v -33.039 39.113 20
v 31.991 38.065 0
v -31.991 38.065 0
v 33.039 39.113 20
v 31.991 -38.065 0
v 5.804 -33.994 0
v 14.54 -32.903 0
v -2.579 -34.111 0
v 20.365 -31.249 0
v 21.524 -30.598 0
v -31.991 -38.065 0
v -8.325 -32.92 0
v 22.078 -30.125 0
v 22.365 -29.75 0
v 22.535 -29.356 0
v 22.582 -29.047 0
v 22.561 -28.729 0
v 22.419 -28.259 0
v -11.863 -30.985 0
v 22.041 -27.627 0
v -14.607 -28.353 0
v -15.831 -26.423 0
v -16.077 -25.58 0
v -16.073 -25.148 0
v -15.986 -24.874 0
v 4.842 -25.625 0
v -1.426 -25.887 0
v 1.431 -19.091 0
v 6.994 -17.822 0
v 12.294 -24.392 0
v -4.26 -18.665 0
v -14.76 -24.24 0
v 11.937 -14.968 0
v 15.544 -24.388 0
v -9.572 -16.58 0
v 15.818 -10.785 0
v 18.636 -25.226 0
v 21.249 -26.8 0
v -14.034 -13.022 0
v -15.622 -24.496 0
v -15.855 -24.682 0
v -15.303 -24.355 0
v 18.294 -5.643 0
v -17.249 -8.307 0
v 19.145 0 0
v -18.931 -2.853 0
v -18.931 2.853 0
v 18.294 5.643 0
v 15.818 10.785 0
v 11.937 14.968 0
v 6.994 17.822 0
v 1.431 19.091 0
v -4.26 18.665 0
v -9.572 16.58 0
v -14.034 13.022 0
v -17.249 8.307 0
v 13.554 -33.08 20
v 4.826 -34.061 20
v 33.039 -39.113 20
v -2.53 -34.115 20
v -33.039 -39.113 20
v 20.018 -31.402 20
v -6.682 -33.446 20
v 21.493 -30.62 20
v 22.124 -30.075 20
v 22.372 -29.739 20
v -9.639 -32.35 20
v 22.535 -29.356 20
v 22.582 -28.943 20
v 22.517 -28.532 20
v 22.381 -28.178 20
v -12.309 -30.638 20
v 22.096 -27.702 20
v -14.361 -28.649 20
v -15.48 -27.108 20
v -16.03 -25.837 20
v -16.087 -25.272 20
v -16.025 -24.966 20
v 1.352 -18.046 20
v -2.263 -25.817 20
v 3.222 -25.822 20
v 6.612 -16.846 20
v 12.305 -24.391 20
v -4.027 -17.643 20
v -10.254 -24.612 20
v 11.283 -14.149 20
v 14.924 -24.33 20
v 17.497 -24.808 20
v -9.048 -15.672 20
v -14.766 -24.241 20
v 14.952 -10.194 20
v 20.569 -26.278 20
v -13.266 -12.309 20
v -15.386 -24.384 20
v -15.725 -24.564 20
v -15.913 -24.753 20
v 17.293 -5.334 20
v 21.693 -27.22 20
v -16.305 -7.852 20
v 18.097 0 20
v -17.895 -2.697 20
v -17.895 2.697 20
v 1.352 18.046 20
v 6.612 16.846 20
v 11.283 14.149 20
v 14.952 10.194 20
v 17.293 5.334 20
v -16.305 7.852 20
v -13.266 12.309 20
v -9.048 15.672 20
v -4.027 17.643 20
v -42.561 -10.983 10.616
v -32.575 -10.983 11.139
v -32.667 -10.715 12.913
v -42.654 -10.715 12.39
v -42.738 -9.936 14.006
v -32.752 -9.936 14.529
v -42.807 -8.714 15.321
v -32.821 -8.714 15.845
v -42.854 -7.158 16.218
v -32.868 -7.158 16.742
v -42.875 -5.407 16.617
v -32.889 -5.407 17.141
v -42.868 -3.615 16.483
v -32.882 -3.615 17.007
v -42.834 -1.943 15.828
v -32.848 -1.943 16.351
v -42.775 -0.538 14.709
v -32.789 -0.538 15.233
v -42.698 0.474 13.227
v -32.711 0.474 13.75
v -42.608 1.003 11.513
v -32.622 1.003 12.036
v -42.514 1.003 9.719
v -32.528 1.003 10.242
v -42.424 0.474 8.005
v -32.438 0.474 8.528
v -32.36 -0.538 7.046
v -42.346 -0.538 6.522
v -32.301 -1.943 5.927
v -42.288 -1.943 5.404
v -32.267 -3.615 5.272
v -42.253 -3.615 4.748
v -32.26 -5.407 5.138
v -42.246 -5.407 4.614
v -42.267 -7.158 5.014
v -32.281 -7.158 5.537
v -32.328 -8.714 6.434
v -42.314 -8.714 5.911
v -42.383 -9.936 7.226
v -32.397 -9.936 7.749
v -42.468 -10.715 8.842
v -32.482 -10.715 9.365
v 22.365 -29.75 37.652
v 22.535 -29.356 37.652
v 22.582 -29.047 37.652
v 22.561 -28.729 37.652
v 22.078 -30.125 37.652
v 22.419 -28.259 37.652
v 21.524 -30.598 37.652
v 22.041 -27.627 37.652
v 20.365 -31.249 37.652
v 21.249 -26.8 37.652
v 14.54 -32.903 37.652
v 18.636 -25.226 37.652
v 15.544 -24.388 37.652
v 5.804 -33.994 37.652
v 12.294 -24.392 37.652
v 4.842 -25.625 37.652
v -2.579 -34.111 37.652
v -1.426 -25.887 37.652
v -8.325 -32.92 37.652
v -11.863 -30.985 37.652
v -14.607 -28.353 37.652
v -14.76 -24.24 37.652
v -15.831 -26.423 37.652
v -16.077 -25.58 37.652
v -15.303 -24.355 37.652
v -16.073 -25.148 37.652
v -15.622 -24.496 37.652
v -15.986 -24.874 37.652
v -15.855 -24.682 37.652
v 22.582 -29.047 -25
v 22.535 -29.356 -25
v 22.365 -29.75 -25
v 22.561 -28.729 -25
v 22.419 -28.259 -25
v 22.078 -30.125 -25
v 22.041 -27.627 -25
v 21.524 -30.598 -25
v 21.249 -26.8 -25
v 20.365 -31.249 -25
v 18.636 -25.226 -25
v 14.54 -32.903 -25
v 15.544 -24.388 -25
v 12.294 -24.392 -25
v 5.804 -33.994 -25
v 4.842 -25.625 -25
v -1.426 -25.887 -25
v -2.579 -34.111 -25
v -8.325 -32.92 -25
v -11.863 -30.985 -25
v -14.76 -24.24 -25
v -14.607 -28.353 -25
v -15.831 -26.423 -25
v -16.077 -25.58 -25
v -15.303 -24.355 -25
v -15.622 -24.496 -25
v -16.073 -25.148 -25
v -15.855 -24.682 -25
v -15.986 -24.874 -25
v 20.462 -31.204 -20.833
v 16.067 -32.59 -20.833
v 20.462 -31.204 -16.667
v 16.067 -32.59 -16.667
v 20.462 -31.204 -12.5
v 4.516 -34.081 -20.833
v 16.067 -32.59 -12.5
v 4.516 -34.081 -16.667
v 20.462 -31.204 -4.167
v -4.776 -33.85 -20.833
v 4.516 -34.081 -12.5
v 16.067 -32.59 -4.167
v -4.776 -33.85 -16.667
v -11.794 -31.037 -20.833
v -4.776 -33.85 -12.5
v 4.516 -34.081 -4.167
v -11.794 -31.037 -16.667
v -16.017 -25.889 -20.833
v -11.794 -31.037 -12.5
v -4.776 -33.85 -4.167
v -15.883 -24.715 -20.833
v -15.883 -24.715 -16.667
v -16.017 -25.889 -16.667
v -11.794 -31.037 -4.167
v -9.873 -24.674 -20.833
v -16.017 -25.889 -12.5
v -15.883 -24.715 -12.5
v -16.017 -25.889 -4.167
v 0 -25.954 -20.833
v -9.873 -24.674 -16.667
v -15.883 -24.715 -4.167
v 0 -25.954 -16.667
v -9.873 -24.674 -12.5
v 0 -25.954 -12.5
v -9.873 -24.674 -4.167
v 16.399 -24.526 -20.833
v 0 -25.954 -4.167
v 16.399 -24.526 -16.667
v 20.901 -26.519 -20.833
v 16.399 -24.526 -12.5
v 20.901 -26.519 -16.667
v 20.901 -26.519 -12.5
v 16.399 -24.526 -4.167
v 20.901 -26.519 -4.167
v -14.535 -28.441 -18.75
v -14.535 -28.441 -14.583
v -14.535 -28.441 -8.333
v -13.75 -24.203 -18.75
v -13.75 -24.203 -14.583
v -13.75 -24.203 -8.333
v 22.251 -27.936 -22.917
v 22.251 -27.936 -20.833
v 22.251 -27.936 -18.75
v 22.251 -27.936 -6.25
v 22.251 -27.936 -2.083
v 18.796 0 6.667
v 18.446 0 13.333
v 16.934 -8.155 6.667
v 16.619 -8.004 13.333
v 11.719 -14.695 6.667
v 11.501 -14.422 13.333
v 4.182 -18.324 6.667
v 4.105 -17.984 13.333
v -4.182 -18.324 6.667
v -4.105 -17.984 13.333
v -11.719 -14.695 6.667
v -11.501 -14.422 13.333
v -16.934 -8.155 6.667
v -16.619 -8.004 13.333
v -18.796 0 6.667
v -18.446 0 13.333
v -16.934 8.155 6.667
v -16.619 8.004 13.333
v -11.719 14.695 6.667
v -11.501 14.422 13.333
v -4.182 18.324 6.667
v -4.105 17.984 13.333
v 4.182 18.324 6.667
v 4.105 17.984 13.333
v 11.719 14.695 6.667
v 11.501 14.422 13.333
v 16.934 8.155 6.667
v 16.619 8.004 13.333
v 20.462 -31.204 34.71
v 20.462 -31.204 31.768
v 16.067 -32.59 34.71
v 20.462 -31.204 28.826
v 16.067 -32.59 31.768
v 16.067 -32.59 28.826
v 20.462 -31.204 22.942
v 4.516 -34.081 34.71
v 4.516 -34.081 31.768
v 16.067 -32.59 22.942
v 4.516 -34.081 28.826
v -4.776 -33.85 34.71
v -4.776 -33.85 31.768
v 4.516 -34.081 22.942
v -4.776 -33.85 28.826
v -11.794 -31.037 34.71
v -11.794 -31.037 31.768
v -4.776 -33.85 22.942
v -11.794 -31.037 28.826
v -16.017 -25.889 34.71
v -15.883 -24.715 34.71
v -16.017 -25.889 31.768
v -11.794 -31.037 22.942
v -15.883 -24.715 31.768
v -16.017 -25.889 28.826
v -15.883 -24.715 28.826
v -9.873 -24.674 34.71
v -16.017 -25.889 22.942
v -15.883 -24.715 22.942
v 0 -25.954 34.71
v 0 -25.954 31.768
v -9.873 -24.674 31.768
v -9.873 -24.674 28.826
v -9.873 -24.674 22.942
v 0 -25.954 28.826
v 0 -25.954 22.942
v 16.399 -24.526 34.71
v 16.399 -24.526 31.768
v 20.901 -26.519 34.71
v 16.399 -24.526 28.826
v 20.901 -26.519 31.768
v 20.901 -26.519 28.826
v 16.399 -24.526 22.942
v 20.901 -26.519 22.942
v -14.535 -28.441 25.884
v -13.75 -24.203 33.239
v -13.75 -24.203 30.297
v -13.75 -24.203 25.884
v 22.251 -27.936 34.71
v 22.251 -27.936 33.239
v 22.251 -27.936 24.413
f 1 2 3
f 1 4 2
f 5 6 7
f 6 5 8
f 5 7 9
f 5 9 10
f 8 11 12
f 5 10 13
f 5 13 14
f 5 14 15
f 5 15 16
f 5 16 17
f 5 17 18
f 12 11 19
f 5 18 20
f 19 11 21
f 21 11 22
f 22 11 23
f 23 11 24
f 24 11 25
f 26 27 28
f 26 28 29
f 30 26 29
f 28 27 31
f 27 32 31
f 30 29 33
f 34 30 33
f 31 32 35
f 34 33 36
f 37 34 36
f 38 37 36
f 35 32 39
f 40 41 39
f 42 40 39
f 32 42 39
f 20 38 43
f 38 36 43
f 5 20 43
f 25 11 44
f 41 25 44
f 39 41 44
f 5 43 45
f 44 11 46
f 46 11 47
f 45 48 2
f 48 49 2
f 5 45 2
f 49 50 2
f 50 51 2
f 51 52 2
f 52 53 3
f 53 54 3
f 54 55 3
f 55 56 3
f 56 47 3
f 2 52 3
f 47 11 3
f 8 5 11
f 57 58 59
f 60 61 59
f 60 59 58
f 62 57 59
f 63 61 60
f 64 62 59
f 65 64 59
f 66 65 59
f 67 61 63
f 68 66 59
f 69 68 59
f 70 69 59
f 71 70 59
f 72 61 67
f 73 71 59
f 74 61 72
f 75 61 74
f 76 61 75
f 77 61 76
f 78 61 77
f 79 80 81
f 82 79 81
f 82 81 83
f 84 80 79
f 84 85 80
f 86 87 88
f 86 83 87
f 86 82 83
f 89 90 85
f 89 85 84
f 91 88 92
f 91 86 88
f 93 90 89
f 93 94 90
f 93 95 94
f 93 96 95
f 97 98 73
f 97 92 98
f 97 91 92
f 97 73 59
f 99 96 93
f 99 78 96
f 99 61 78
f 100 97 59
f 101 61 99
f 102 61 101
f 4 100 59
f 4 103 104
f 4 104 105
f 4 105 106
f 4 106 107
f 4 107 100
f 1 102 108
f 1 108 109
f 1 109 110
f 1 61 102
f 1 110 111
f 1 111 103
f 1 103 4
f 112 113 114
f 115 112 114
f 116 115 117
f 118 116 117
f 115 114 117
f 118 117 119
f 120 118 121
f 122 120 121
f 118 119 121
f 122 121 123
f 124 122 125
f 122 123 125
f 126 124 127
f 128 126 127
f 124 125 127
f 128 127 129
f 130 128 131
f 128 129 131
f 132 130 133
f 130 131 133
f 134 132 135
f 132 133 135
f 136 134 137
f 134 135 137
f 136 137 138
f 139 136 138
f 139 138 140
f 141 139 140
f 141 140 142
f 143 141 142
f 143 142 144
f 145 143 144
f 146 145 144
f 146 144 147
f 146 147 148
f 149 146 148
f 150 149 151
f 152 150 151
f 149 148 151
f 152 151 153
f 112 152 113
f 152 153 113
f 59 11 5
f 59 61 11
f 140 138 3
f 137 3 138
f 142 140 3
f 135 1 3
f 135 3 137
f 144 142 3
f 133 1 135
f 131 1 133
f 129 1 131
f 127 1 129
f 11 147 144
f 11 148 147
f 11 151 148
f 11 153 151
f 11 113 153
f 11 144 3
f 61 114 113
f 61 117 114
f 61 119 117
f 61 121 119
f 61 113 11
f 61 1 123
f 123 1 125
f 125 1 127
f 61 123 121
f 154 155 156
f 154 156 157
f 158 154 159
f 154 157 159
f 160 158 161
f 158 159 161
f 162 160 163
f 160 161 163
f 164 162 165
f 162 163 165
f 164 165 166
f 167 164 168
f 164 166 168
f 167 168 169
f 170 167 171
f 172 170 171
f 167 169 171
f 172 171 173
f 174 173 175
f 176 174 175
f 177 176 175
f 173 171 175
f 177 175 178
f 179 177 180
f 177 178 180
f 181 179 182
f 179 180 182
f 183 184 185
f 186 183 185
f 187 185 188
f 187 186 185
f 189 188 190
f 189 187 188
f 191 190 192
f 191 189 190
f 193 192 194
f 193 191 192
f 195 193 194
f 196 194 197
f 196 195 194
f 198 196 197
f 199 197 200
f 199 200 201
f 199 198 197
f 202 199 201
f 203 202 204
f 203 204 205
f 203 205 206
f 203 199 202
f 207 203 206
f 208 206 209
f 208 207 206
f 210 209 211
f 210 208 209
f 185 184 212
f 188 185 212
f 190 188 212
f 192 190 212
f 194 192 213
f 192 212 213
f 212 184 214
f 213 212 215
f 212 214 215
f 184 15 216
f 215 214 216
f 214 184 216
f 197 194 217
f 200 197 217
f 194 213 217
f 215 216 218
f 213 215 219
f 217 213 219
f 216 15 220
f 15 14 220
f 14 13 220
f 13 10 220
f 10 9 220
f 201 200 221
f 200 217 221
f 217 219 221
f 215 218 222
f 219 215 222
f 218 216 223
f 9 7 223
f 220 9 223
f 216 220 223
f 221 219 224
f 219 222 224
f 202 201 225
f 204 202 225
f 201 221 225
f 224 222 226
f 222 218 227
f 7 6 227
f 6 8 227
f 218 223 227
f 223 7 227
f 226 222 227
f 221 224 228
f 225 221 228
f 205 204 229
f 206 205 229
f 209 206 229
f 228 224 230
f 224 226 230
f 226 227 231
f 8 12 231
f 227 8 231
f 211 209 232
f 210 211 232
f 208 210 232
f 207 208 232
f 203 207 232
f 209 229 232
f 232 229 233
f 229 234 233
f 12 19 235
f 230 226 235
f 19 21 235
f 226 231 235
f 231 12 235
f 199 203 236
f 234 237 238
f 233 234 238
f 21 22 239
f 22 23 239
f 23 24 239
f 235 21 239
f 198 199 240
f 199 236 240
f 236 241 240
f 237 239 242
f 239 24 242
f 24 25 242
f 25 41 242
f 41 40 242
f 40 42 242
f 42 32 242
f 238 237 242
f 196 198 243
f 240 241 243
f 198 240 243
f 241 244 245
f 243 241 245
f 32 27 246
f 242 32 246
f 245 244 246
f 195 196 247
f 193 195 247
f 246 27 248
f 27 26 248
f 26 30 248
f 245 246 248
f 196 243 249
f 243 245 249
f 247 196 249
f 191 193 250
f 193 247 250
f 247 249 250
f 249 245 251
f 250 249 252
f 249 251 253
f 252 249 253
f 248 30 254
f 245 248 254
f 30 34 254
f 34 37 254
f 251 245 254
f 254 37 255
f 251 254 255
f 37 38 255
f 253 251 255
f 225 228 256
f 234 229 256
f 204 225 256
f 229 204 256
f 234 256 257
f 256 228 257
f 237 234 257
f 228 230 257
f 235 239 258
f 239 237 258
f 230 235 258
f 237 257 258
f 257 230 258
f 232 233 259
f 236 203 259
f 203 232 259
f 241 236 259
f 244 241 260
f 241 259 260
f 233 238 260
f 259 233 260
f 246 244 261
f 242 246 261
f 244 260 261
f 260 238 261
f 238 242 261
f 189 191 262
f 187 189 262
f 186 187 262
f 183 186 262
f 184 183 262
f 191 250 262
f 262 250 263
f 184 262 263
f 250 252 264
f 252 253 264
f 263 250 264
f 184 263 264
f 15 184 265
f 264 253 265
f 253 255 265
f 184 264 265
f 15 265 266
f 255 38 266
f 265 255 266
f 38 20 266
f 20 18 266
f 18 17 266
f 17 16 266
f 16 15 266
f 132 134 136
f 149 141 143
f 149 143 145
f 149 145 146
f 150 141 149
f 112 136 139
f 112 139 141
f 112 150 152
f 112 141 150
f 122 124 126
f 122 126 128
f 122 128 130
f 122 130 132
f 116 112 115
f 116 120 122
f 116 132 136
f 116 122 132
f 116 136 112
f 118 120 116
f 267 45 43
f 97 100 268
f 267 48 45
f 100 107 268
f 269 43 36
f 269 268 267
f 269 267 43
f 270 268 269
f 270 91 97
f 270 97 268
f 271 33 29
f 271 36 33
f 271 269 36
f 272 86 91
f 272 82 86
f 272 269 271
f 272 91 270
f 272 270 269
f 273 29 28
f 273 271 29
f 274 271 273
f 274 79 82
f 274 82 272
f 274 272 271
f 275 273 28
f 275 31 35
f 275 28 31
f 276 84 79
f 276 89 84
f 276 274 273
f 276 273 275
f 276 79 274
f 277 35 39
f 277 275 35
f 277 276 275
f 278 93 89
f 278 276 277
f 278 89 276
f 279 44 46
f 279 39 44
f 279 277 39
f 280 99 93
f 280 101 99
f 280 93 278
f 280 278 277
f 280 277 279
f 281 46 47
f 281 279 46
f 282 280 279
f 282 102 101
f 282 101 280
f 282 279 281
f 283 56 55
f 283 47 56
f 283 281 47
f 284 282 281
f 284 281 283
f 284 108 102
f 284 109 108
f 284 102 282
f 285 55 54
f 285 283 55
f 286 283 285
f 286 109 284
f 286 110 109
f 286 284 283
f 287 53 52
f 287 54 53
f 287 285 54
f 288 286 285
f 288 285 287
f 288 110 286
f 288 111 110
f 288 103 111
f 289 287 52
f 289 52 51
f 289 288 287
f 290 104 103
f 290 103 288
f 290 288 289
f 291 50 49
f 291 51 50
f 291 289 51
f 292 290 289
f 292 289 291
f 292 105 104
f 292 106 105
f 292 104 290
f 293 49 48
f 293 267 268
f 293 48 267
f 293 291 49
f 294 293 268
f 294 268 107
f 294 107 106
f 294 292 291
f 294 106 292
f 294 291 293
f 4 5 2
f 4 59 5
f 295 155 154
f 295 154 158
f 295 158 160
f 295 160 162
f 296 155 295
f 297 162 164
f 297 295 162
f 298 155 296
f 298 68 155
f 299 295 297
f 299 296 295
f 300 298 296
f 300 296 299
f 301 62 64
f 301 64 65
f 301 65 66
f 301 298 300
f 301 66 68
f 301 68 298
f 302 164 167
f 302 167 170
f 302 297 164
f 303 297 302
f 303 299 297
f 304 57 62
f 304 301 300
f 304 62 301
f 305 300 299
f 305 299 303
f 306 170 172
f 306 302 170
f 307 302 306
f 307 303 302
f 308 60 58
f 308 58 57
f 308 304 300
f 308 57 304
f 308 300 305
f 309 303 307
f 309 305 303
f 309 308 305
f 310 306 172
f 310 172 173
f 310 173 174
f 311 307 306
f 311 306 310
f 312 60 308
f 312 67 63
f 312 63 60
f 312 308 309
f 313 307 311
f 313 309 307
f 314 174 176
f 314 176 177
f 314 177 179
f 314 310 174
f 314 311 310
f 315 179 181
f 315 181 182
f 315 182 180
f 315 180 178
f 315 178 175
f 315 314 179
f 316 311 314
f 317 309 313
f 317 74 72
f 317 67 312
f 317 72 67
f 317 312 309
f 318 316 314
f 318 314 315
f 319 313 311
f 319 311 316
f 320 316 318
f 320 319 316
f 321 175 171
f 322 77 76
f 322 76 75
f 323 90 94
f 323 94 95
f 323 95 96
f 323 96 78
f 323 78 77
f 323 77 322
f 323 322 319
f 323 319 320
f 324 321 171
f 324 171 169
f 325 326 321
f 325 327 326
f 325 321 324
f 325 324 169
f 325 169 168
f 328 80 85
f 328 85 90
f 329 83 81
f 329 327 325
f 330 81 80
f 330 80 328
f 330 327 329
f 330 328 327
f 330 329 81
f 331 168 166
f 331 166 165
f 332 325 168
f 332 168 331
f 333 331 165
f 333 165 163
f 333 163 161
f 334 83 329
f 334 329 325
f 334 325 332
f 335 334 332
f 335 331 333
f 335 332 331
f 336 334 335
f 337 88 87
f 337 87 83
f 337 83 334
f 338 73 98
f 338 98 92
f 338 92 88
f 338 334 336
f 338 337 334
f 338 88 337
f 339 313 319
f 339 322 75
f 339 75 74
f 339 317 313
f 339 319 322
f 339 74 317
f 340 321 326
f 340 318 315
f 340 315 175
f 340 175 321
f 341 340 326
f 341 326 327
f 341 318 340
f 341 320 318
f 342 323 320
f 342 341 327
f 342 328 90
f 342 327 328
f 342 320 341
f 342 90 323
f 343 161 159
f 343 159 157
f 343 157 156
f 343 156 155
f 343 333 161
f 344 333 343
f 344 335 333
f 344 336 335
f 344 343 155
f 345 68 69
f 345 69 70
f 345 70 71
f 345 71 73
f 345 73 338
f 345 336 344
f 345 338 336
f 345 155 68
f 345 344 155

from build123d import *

# Parameters (mm, degrees)
F0_W          = 63.9814883471
F0_H          = 76.1306285858
F0_R          = 19.1449958306
F1_DEPTH      = 20
F1_TAPER      = -3
F2_R          = 6.0265715507
F3_DEPTH      = 10
F5_DEPTH      = 25
F5_DEPTH_BACK = 37.6516953111


with BuildPart() as f1:
    # F0 (on Top) → F1 (new body)
    with BuildSketch(Plane.XY):
        Rectangle(F0_W, F0_H)
        Circle(F0_R, mode=Mode.SUBTRACT)
    extrude(amount=F1_DEPTH, taper=F1_TAPER)

    # F2 (on face) → F3 (join)
    with BuildSketch(Plane(origin=(-31.9031198516, 0, -1.6719716636), x_dir=(0, -1, 0), z_dir=(-0.9986295348, 0, -0.0523359562))):
        with Locations((4.9562286586, 12.8287989646)):
            Circle(F2_R)
    extrude(amount=F3_DEPTH)

    # F4 (on face) → F5 (join, two sides)
    with BuildSketch(Plane.XY) as f5_sk:
        with BuildLine():
            add(Edge.make_bspline(
                [(22.5351676345, -29.3560177088), (21.7851462413, -32.1408402275), (2.8499068429, -35.0155943736), (-11.178209398, -33.7274369658), (-20.0921889387, -21.210911456), (1.7116247617, -28.5954993301), (14.9698227985, -21.7900850901), (23.0207599501, -27.5530179173), (22.5351676345, -29.3560177088)],
                knots=[0, 0, 0, 0, 0.1963973564, 0.3817420716, 0.5066025932, 0.6882253595, 0.8728448976, 1, 1, 1, 1], degree=3))
        make_face()
    extrude(amount=-F5_DEPTH)
    extrude(f5_sk.sketch, amount=F5_DEPTH_BACK)


solid = f1.part
